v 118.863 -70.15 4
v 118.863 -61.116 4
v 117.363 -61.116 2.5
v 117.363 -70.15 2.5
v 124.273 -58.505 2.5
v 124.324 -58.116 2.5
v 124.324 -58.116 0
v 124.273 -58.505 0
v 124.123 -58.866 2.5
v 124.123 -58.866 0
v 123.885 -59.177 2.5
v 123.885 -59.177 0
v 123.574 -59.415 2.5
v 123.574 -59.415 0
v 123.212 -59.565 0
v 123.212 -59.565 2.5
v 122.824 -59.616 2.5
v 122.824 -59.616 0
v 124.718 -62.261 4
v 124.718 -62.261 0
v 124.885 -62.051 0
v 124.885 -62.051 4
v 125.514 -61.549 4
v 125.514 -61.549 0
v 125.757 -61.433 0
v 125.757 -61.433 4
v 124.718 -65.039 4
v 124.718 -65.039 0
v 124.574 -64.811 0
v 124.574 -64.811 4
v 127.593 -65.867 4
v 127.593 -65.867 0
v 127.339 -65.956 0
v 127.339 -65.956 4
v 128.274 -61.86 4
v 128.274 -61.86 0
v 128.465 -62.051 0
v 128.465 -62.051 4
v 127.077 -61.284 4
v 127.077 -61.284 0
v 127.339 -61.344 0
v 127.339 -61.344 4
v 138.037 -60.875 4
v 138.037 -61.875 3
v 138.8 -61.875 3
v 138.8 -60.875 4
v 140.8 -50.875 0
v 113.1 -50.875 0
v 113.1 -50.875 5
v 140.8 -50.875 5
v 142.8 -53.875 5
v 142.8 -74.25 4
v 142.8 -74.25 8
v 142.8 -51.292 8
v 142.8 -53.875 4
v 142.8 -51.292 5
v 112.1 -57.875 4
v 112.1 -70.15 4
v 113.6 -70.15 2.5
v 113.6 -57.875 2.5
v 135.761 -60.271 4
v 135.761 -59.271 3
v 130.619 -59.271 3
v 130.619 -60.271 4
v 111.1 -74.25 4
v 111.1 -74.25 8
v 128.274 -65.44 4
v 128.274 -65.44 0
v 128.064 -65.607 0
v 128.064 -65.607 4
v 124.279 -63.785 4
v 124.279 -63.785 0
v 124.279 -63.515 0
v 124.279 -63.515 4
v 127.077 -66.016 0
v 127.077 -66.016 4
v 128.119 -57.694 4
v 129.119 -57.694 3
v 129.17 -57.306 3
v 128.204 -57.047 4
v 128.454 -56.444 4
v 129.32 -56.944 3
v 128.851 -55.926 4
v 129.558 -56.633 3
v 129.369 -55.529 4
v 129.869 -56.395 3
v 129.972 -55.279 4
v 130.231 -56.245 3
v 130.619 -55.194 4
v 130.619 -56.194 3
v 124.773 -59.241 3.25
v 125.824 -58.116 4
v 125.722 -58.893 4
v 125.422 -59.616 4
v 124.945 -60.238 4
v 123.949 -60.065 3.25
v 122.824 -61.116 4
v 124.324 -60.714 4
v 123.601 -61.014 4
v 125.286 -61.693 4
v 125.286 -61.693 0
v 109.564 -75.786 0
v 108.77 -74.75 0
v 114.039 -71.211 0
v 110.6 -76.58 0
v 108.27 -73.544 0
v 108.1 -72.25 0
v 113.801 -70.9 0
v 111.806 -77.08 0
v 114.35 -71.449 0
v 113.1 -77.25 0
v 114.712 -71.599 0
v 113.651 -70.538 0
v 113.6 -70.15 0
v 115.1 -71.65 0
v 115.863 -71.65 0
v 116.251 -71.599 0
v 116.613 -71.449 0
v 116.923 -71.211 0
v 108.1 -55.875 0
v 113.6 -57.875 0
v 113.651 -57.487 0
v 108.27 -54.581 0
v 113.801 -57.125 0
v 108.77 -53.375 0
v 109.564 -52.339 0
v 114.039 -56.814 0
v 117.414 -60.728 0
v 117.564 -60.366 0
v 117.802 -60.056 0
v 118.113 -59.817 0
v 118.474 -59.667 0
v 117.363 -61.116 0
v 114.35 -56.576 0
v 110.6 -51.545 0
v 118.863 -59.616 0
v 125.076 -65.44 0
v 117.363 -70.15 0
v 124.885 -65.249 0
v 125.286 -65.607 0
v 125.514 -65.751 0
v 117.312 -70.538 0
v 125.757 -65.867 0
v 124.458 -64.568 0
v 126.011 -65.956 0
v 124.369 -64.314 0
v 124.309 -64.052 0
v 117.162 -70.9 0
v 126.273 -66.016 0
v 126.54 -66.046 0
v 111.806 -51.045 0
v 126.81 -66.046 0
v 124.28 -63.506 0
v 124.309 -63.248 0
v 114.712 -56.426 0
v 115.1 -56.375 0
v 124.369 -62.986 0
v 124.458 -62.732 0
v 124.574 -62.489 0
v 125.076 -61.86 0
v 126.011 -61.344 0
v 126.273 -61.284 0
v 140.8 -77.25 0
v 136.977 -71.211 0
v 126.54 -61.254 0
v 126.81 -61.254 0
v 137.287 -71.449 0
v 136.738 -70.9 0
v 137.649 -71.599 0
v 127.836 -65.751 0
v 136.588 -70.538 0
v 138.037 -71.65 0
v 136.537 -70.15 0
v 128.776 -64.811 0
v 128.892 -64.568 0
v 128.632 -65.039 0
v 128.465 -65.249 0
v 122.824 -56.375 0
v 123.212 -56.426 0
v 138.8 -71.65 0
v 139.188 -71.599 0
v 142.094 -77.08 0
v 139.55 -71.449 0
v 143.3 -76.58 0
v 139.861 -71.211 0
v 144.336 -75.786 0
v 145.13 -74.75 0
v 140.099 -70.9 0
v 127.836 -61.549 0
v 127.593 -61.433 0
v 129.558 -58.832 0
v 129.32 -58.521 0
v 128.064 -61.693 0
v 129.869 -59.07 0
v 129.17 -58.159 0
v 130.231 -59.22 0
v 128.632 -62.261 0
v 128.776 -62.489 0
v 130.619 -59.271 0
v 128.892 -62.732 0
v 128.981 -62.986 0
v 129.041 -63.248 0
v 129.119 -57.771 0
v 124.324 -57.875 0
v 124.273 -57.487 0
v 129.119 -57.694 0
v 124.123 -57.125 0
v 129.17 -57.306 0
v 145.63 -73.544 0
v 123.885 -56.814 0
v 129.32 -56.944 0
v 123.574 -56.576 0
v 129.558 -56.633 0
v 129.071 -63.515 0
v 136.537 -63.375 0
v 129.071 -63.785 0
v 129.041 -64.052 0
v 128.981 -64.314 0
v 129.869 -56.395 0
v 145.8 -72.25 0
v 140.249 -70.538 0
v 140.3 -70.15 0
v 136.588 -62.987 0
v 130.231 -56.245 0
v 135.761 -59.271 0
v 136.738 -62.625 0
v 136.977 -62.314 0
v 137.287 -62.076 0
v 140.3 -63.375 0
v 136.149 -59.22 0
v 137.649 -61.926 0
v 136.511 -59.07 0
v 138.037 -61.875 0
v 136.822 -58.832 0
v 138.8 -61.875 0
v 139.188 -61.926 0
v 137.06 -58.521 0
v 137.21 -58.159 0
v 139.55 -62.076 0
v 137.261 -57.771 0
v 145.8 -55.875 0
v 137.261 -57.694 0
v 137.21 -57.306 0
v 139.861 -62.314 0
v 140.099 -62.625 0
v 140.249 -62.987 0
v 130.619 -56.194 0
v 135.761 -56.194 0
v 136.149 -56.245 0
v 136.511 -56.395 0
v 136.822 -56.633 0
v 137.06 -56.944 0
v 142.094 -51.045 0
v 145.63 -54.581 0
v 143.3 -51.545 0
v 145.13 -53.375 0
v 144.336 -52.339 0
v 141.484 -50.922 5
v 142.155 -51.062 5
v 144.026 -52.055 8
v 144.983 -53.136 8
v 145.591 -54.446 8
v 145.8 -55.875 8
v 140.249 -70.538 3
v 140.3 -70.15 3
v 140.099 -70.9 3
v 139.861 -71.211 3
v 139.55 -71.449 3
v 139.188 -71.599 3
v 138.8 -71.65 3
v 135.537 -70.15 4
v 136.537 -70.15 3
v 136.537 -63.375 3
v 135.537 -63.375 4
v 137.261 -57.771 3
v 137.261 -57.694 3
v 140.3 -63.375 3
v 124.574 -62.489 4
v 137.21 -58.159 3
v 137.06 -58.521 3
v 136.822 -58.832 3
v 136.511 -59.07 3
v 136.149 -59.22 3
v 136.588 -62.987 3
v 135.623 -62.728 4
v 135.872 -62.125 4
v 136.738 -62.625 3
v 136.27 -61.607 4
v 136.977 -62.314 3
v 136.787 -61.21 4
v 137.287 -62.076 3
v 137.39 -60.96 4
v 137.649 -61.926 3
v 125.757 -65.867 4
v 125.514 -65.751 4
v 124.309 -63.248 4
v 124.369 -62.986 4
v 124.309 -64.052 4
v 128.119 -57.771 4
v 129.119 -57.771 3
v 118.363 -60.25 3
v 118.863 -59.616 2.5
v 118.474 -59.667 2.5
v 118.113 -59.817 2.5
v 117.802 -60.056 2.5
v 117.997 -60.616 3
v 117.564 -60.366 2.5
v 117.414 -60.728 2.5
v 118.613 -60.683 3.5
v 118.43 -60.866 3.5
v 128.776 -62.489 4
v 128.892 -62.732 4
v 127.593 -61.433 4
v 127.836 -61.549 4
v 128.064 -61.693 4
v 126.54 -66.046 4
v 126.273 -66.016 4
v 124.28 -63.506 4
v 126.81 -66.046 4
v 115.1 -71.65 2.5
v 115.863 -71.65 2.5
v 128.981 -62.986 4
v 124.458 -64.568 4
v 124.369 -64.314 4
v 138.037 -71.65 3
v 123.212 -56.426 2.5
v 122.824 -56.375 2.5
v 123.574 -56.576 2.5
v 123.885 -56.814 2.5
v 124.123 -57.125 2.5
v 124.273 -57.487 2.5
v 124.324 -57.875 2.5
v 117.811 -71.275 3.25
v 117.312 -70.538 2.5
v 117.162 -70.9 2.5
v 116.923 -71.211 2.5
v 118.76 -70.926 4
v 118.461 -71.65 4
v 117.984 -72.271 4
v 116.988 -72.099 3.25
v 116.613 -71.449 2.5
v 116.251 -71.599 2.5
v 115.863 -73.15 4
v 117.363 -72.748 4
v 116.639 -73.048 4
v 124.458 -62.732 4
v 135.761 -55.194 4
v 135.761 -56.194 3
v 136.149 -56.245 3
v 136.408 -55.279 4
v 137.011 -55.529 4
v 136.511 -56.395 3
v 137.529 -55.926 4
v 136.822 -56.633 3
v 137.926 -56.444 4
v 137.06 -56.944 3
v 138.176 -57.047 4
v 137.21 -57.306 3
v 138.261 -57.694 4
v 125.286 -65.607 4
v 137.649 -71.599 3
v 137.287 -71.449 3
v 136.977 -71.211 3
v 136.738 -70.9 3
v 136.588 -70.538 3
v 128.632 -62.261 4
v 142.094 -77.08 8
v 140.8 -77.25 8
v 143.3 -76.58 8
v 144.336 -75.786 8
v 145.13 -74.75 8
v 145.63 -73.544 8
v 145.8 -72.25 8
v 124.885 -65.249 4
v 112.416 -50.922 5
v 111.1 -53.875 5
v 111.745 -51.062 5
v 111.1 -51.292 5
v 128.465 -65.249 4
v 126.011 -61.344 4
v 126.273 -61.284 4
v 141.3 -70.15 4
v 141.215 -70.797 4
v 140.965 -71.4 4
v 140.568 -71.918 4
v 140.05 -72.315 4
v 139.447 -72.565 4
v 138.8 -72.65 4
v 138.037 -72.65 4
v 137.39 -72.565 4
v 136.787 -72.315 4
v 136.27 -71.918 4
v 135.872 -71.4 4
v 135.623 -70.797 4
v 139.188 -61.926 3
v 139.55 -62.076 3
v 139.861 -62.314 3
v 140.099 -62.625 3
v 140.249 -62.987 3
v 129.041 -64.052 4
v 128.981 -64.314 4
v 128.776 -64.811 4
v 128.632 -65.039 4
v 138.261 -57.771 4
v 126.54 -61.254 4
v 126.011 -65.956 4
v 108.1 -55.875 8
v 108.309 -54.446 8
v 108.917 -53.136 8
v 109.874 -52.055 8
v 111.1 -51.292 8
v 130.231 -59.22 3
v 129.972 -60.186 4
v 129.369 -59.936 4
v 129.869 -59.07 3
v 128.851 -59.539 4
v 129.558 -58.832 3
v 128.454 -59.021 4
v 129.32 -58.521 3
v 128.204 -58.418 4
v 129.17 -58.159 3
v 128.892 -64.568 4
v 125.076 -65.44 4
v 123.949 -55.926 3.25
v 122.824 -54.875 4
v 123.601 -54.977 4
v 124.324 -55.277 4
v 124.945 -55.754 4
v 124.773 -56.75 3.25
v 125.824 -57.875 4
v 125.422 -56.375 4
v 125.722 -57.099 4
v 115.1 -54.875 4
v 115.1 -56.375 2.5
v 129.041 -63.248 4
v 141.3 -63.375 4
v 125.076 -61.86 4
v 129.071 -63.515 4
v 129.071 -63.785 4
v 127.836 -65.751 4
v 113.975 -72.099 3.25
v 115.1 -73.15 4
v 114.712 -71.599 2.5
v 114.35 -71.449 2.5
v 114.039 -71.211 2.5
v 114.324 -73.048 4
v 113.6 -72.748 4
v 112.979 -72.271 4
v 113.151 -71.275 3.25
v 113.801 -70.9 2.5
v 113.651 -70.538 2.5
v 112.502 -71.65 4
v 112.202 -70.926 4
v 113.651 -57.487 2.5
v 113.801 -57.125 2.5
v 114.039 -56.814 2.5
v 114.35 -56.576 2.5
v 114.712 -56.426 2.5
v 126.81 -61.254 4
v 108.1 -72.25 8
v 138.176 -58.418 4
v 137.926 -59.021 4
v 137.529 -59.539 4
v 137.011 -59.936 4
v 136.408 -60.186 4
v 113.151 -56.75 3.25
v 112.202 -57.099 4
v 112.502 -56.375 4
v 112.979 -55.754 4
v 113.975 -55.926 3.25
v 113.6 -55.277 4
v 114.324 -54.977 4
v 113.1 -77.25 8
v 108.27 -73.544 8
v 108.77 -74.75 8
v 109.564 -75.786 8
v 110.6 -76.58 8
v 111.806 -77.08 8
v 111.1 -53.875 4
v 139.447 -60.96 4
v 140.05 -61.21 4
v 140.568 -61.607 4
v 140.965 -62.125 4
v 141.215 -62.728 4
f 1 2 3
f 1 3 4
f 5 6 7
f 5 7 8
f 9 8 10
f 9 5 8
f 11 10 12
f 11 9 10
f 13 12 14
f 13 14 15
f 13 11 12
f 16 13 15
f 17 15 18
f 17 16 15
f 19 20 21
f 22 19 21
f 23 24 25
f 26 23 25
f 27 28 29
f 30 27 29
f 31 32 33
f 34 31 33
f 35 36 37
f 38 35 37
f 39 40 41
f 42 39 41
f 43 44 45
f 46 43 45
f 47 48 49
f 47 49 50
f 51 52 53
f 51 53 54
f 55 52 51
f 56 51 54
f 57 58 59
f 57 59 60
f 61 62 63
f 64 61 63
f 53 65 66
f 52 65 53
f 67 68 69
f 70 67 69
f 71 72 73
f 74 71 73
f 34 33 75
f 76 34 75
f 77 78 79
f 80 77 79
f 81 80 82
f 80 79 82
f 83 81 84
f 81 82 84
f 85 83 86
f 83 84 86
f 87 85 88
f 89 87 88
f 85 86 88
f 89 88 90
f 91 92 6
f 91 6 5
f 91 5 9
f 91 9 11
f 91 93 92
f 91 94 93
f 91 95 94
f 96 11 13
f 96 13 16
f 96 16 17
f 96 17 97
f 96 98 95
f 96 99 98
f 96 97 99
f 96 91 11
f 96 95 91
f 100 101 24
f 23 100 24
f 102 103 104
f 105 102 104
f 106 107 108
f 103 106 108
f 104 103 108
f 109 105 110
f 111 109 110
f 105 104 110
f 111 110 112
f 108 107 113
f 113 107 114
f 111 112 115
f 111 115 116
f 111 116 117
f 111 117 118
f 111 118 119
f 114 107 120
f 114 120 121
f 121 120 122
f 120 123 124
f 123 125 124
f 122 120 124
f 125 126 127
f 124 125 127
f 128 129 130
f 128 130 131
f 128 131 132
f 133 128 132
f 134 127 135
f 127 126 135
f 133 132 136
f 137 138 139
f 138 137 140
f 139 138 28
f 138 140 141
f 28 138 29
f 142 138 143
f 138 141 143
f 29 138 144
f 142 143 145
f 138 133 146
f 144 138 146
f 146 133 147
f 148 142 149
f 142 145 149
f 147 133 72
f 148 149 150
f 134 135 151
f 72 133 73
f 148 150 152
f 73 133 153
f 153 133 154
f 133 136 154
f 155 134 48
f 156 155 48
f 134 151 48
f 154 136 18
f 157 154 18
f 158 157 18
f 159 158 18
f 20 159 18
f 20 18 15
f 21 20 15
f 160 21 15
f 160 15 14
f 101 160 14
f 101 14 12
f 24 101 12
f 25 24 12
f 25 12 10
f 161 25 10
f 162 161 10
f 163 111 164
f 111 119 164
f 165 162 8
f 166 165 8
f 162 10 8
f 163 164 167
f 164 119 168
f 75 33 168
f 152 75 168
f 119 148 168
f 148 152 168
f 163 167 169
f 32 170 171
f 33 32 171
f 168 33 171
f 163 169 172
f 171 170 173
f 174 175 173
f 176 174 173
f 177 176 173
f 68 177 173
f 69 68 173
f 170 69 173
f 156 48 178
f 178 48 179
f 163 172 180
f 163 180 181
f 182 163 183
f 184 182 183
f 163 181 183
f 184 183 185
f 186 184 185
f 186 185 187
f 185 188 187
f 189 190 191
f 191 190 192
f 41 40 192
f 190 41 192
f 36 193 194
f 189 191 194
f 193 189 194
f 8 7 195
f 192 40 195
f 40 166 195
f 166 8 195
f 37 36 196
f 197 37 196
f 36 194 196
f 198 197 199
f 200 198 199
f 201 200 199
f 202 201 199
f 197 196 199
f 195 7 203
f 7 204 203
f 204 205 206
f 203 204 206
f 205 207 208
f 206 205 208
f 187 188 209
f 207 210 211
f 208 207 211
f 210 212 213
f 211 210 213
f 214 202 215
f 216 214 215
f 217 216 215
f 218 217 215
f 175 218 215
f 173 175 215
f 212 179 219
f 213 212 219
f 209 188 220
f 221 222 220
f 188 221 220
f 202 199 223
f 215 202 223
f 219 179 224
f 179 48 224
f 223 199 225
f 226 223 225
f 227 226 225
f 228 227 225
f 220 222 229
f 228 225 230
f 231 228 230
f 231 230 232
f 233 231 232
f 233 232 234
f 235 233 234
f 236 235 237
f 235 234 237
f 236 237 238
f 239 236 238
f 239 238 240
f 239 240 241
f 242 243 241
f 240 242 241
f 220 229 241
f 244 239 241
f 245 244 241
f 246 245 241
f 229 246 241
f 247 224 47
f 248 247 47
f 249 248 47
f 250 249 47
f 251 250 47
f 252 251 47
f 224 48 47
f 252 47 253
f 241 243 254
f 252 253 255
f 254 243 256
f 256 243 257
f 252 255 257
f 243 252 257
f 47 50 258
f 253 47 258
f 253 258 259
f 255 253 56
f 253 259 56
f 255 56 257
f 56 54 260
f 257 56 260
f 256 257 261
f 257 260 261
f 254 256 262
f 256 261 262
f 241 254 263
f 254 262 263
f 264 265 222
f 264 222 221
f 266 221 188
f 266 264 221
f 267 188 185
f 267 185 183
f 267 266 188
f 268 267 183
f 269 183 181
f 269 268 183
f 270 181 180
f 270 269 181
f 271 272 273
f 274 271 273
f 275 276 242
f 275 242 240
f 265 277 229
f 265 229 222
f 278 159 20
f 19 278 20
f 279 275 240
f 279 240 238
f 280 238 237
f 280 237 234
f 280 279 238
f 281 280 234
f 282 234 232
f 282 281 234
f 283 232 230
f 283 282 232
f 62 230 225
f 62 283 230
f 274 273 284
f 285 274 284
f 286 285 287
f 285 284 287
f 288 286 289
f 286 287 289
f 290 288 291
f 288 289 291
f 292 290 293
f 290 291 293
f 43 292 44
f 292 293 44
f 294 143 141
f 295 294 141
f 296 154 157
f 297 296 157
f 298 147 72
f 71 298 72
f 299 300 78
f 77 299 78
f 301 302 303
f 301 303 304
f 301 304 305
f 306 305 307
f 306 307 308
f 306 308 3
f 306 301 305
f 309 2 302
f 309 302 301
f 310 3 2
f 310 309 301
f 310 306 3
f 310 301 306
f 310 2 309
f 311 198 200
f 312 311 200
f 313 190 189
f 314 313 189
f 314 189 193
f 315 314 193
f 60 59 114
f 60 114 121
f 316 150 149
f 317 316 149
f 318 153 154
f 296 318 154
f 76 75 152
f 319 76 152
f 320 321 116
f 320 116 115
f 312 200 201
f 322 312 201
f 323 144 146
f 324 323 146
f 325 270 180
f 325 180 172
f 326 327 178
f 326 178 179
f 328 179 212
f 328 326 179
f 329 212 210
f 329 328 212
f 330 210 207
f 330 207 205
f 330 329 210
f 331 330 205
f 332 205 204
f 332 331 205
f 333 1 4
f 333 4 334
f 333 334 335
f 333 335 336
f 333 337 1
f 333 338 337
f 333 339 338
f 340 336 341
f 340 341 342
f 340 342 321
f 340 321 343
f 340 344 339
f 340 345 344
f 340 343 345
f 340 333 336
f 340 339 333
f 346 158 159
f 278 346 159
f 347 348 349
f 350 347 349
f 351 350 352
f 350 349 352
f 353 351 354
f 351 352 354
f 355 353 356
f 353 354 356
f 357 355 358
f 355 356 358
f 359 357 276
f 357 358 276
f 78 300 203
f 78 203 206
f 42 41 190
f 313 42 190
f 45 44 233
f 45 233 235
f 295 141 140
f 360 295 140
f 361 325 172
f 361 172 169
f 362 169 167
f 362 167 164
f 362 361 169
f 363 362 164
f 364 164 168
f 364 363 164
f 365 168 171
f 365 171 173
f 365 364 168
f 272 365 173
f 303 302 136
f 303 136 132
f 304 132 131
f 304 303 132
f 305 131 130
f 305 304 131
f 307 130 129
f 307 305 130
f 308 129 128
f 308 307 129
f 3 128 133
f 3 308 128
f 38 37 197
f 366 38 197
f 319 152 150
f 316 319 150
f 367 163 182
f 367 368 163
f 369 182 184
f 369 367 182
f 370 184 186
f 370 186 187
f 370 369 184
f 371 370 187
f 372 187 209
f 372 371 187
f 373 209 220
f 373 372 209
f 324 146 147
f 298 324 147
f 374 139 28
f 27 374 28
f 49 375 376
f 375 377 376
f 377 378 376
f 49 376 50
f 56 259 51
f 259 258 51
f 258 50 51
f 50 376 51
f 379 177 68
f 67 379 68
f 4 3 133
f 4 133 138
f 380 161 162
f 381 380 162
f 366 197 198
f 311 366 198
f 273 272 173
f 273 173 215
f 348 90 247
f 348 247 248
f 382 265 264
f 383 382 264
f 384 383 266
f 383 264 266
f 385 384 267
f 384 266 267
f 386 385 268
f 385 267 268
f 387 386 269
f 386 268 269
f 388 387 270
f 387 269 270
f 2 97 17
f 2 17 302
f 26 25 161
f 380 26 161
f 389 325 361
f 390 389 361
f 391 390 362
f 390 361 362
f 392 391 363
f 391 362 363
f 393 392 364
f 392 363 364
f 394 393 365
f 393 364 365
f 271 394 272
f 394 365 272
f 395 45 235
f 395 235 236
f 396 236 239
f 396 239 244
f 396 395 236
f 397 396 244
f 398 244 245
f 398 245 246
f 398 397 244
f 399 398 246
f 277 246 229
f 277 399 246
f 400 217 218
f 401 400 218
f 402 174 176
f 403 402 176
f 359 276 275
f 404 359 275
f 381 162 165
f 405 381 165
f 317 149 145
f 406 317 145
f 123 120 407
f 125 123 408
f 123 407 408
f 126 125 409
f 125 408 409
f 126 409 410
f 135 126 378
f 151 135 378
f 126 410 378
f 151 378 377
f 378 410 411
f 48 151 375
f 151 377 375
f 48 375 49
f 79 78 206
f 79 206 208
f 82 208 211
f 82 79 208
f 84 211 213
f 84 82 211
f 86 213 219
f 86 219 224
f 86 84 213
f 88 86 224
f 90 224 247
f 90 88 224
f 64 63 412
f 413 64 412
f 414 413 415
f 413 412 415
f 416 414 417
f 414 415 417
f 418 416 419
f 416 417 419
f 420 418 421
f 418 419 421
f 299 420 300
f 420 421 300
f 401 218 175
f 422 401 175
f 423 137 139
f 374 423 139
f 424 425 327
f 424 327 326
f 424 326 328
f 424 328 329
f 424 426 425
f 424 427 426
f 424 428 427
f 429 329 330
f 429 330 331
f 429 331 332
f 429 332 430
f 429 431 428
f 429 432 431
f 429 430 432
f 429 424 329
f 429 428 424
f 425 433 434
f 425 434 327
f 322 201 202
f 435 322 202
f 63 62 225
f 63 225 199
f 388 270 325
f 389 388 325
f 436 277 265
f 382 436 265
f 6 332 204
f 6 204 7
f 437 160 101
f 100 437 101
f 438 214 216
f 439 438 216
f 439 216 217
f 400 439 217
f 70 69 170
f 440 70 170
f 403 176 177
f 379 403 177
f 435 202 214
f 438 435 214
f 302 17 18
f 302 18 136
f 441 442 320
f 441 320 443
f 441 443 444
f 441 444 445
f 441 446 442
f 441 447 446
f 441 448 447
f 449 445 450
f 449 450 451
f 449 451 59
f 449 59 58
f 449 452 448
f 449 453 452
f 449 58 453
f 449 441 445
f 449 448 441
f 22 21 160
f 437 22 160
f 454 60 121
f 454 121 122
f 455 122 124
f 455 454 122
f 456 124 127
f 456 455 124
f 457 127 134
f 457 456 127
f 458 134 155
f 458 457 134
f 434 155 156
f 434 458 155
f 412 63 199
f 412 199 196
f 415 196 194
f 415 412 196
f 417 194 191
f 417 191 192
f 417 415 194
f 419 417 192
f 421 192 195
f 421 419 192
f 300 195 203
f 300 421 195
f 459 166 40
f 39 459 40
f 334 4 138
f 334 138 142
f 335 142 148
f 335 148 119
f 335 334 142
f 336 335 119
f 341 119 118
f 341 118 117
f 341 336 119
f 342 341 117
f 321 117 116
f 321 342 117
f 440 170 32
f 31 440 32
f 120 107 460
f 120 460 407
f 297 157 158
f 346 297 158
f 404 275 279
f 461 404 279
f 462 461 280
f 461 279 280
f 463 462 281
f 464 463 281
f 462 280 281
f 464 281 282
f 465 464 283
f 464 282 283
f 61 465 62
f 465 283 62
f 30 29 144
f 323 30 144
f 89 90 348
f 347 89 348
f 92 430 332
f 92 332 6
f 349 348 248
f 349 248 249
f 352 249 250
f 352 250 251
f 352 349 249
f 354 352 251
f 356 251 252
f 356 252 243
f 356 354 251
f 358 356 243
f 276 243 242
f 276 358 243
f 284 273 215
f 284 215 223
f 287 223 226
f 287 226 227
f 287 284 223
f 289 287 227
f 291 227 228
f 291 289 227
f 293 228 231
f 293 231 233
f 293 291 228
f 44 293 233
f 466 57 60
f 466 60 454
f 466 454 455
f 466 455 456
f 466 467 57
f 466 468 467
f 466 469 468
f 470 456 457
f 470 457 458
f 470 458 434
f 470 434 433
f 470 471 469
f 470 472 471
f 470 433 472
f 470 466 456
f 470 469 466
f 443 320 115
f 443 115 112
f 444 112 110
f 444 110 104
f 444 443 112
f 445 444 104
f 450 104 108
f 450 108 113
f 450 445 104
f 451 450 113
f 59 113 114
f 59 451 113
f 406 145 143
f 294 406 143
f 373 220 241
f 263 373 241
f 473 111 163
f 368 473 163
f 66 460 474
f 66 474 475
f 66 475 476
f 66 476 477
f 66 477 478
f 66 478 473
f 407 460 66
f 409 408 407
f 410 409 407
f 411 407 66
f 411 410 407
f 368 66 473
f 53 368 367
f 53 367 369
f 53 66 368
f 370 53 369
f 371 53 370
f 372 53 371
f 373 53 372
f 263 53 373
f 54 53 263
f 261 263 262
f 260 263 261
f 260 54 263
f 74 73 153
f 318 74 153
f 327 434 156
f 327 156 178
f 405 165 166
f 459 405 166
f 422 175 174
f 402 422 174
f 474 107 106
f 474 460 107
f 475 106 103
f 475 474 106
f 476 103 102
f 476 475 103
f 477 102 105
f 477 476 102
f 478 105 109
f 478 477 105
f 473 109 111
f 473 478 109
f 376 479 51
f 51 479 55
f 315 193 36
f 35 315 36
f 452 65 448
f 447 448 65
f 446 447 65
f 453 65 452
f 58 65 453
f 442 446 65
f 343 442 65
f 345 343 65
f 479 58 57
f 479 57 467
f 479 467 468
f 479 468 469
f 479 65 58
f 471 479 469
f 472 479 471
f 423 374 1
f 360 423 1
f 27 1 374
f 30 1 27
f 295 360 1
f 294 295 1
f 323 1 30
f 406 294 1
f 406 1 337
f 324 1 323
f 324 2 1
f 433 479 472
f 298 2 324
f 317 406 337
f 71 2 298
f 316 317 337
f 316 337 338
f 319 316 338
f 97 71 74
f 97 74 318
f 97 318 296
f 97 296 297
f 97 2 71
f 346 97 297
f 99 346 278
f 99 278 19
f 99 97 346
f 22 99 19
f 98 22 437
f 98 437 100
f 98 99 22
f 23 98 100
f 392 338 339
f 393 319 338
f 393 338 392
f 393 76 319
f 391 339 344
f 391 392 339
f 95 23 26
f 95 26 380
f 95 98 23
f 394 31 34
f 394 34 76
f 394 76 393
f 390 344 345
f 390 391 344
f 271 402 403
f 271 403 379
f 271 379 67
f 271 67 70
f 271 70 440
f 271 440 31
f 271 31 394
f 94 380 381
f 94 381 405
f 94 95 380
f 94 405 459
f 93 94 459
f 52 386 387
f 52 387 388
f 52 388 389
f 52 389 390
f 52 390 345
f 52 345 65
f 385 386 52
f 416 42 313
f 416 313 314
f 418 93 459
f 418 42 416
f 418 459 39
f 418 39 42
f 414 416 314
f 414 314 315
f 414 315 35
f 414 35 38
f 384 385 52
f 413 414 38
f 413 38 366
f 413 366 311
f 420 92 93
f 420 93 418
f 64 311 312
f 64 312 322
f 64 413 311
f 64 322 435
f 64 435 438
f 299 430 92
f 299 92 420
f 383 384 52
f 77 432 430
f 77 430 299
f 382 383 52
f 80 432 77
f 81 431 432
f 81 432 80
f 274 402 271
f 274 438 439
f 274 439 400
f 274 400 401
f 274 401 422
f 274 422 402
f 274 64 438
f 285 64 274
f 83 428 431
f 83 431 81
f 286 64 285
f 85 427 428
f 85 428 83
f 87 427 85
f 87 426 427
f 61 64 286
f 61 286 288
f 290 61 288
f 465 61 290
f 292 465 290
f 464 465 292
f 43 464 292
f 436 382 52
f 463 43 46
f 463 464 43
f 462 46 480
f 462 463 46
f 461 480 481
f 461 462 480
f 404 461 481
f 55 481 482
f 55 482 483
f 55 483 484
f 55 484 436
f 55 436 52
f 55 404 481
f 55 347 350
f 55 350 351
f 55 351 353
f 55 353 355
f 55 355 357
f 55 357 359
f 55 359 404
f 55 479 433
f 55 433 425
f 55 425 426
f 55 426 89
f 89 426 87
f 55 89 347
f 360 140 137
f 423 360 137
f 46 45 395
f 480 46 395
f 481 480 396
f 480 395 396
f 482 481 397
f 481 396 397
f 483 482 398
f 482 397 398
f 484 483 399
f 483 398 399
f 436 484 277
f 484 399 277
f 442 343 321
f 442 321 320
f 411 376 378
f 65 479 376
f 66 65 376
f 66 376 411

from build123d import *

# Parameters (mm, degrees)
MODEL_W                      = 31.7
MODEL_H                      = 20.375
SALIENTE_EXTRUIR1_DEPTH      = 4
SALIENTE_EXTRUIR2_DEPTH      = 4
SALIENTE_EXTRUIR2_DEPTH_BACK = 4
CROQUIS3_W                   = 37.7
CROQUIS3_H                   = 26.375
CROQUIS3_W_2                 = 31.7
CROQUIS3_H_2                 = 20.375
REDONDEO1_R                  = 5
REDONDEO3_R                  = 5
CROQUIS8_W                   = 31.7
CROQUIS8_H                   = 3.000145556
CORTAR_EXTRUIR2_DEPTH        = 4
CORTAR_EXTRUIR3_DEPTH        = 4
CHAFL_N3_SIZE                = 1.5
CHAFL_N4_SIZE                = 1


with BuildPart() as part:
    # Model → Saliente-Extruir1 (new body)
    with BuildSketch(Plane.XY):
        with Locations((126.95, -64.0625)):
            Rectangle(MODEL_W, MODEL_H)
        Polygon((126.809569, -61.253776), (127.077015, -61.28391), (127.339405, -61.343798), (127.59344, -61.432689), (127.835925, -61.549464), (128.063811, -61.692654), (128.274232, -61.860459), (128.464541, -62.050768), (128.632346, -62.261189), (128.775536, -62.489075), (128.892311, -62.73156), (128.981202, -62.985595), (129.04109, -63.247985), (129.071224, -63.515431), (129.071224, -63.784569), (129.04109, -64.052015), (128.981202, -64.314405), (128.892311, -64.56844), (128.775536, -64.810925), (128.632346, -65.038811), (128.464541, -65.249232), (128.274232, -65.439541), (128.063811, -65.607346), (127.835925, -65.750536), (127.59344, -65.867311), (127.339405, -65.956202), (127.077015, -66.01609), (126.809569, -66.046224), (126.540431, -66.046224), (126.272985, -66.01609), (126.010595, -65.956202), (125.75656, -65.867311), (125.514075, -65.750536), (125.286189, -65.607346), (125.075768, -65.439541), (124.885459, -65.249232), (124.717654, -65.038811), (124.574464, -64.810925), (124.457689, -64.56844), (124.368798, -64.314405), (124.30891, -64.052015), (124.278776, -63.784569), (124.278776, -63.515431), (124.279861, -63.505804), (124.30891, -63.247985), (124.368798, -62.985595), (124.457689, -62.73156), (124.574464, -62.489075), (124.717654, -62.261189), (124.885459, -62.050768), (125.075768, -61.860459), (125.286189, -61.692654), (125.514075, -61.549464), (125.75656, -61.432689), (126.010595, -61.343798), (126.272985, -61.28391), (126.540431, -61.253776), align=None, mode=Mode.SUBTRACT)
    extrude(amount=SALIENTE_EXTRUIR1_DEPTH)

    # Croquis3 → Saliente-Extruir2 (add, two sides: drawn at the far end of the back side and taken through both)
    with BuildSketch(Plane.XY.offset(4).offset(-SALIENTE_EXTRUIR2_DEPTH_BACK)):
        with Locations((126.95, -64.0625)):
            Rectangle(CROQUIS3_W, CROQUIS3_H)
        with Locations((126.95, -64.0625)):
            Rectangle(CROQUIS3_W_2, CROQUIS3_H_2, mode=Mode.SUBTRACT)
    extrude(amount=SALIENTE_EXTRUIR2_DEPTH + SALIENTE_EXTRUIR2_DEPTH_BACK)

    # Redondeo1
    redondeo1_edges = [part.edges().sort_by_distance(p)[0] for p in [
        (108.1, -77.25, 4),
        (145.8, -77.25, 4),
    ]]
    fillet(redondeo1_edges, radius=REDONDEO1_R)

    # Redondeo3
    redondeo3_edges = [part.edges().sort_by_distance(p)[0] for p in [
        (145.8, -50.875, 4),
        (108.1, -50.875, 4),
    ]]
    fillet(redondeo3_edges, radius=REDONDEO3_R)

    # Croquis8 → Cortar-Extruir2 (cut)
    with BuildSketch(Plane.XZ.offset(53.875)):
        with Locations((126.95, 6.499927222)):
            Rectangle(CROQUIS8_W, CROQUIS8_H)
    extrude(amount=-CORTAR_EXTRUIR2_DEPTH, mode=Mode.SUBTRACT)

    # Croquis9 → Cortar-Extruir3 (cut)
    with BuildSketch(Plane.XY.offset(4)):
        with BuildLine():
            Line((115.1, -56.375), (118.625993534, -56.375))
            Line((118.625993534, -56.375), (122.824085816, -56.375))
            ThreePointArc((122.824085816, -56.375), (123.884745987, -56.814339828), (124.324085816, -57.875))
            Line((124.324085816, -57.875), (124.324085816, -58.116279303))
            ThreePointArc((124.324085816, -58.116279303), (123.884745987, -59.176939475), (122.824085816, -59.616279303))
            Line((122.824085816, -59.616279303), (118.862646904, -59.616279303))
            ThreePointArc((118.862646904, -59.616279303), (117.801986732, -60.055619131), (117.362646904, -61.116279303))
            Line((117.362646904, -61.116279303), (117.362646904, -70.15))
            ThreePointArc((117.362646904, -70.15), (116.923307076, -71.210660172), (115.862646904, -71.65))
            Line((115.862646904, -71.65), (115.1, -71.65))
            ThreePointArc((115.1, -71.65), (114.039339828, -71.210660172), (113.6, -70.15))
            Line((113.6, -70.15), (113.6, -57.875))
            ThreePointArc((113.6, -57.875), (114.039339828, -56.814339828), (115.1, -56.375))
        make_face()
        with BuildLine():
            Line((138.8, -71.65), (138.037353096, -71.65))
            ThreePointArc((138.037353096, -71.65), (136.976692924, -71.210660172), (136.537353096, -70.15))
            Line((136.537353096, -70.15), (136.537353096, -63.375))
            ThreePointArc((136.537353096, -63.375), (136.976692924, -62.314339828), (138.037353096, -61.875))
            Line((138.037353096, -61.875), (138.8, -61.875))
            ThreePointArc((138.8, -61.875), (139.860660172, -62.314339828), (140.3, -63.375))
            Line((140.3, -63.375), (140.3, -70.15))
            ThreePointArc((140.3, -70.15), (139.860660172, -71.210660172), (138.8, -71.65))
        make_face()
        with BuildLine():
            Line((130.618924081, -56.194062707), (135.761102268, -56.194062707))
            ThreePointArc((135.761102268, -56.194062707), (136.82176244, -56.633402535), (137.261102268, -57.694062707))
            Line((137.261102268, -57.694062707), (137.261102268, -57.771184154))
            ThreePointArc((137.261102268, -57.771184154), (136.82176244, -58.831844326), (135.761102268, -59.271184154))
            Line((135.761102268, -59.271184154), (130.618924081, -59.271184154))
            ThreePointArc((130.618924081, -59.271184154), (129.55826391, -58.831844326), (129.118924081, -57.771184154))
            Line((129.118924081, -57.771184154), (129.118924081, -57.694062707))
            ThreePointArc((129.118924081, -57.694062707), (129.55826391, -56.633402535), (130.618924081, -56.194062707))
        make_face()
    extrude(amount=-CORTAR_EXTRUIR3_DEPTH, mode=Mode.SUBTRACT)

    # Chaflán3
    chafl_n3_edges = [part.edges().sort_by_distance(p)[0] for p in [
        (123.884745987, -56.814339828, 4),
        (118.962042908, -56.375, 4),
        (114.039339828, -56.814339828, 4),
        (113.6, -64.0125, 4),
        (114.039339828, -71.210660172, 4),
        (115.481323452, -71.65, 4),
        (116.923307076, -71.210660172, 4),
        (117.362646904, -65.633139651, 4),
        (117.801986732, -60.055619131, 4),
        (120.84336636, -59.616279303, 4),
        (123.884745987, -59.176939475, 4),
        (124.324085816, -57.995639651, 4),
    ]]
    chamfer(chafl_n3_edges, length=CHAFL_N3_SIZE - 0.0001)  # a hair under: the kernel refuses the full size

    # Chaflán4
    chafl_n4_edges = [part.edges().sort_by_distance(p)[0] for p in [
        (139.860660172, -71.210660172, 4),
        (140.3, -66.7625, 4),
        (139.860660172, -62.314339828, 4),
        (138.418676548, -61.875, 4),
        (136.976692924, -62.314339828, 4),
        (136.537353096, -66.7625, 4),
        (136.976692924, -71.210660172, 4),
        (138.418676548, -71.65, 4),
        (136.82176244, -58.831844326, 4),
        (137.261102268, -57.73262343, 4),
        (136.82176244, -56.633402535, 4),
        (133.190013175, -56.194062707, 4),
        (129.55826391, -56.633402535, 4),
        (129.118924081, -57.73262343, 4),
        (129.55826391, -58.831844326, 4),
        (133.190013175, -59.271184154, 4),
    ]]
    chamfer(chafl_n4_edges, length=CHAFL_N4_SIZE)


solid = part.part
